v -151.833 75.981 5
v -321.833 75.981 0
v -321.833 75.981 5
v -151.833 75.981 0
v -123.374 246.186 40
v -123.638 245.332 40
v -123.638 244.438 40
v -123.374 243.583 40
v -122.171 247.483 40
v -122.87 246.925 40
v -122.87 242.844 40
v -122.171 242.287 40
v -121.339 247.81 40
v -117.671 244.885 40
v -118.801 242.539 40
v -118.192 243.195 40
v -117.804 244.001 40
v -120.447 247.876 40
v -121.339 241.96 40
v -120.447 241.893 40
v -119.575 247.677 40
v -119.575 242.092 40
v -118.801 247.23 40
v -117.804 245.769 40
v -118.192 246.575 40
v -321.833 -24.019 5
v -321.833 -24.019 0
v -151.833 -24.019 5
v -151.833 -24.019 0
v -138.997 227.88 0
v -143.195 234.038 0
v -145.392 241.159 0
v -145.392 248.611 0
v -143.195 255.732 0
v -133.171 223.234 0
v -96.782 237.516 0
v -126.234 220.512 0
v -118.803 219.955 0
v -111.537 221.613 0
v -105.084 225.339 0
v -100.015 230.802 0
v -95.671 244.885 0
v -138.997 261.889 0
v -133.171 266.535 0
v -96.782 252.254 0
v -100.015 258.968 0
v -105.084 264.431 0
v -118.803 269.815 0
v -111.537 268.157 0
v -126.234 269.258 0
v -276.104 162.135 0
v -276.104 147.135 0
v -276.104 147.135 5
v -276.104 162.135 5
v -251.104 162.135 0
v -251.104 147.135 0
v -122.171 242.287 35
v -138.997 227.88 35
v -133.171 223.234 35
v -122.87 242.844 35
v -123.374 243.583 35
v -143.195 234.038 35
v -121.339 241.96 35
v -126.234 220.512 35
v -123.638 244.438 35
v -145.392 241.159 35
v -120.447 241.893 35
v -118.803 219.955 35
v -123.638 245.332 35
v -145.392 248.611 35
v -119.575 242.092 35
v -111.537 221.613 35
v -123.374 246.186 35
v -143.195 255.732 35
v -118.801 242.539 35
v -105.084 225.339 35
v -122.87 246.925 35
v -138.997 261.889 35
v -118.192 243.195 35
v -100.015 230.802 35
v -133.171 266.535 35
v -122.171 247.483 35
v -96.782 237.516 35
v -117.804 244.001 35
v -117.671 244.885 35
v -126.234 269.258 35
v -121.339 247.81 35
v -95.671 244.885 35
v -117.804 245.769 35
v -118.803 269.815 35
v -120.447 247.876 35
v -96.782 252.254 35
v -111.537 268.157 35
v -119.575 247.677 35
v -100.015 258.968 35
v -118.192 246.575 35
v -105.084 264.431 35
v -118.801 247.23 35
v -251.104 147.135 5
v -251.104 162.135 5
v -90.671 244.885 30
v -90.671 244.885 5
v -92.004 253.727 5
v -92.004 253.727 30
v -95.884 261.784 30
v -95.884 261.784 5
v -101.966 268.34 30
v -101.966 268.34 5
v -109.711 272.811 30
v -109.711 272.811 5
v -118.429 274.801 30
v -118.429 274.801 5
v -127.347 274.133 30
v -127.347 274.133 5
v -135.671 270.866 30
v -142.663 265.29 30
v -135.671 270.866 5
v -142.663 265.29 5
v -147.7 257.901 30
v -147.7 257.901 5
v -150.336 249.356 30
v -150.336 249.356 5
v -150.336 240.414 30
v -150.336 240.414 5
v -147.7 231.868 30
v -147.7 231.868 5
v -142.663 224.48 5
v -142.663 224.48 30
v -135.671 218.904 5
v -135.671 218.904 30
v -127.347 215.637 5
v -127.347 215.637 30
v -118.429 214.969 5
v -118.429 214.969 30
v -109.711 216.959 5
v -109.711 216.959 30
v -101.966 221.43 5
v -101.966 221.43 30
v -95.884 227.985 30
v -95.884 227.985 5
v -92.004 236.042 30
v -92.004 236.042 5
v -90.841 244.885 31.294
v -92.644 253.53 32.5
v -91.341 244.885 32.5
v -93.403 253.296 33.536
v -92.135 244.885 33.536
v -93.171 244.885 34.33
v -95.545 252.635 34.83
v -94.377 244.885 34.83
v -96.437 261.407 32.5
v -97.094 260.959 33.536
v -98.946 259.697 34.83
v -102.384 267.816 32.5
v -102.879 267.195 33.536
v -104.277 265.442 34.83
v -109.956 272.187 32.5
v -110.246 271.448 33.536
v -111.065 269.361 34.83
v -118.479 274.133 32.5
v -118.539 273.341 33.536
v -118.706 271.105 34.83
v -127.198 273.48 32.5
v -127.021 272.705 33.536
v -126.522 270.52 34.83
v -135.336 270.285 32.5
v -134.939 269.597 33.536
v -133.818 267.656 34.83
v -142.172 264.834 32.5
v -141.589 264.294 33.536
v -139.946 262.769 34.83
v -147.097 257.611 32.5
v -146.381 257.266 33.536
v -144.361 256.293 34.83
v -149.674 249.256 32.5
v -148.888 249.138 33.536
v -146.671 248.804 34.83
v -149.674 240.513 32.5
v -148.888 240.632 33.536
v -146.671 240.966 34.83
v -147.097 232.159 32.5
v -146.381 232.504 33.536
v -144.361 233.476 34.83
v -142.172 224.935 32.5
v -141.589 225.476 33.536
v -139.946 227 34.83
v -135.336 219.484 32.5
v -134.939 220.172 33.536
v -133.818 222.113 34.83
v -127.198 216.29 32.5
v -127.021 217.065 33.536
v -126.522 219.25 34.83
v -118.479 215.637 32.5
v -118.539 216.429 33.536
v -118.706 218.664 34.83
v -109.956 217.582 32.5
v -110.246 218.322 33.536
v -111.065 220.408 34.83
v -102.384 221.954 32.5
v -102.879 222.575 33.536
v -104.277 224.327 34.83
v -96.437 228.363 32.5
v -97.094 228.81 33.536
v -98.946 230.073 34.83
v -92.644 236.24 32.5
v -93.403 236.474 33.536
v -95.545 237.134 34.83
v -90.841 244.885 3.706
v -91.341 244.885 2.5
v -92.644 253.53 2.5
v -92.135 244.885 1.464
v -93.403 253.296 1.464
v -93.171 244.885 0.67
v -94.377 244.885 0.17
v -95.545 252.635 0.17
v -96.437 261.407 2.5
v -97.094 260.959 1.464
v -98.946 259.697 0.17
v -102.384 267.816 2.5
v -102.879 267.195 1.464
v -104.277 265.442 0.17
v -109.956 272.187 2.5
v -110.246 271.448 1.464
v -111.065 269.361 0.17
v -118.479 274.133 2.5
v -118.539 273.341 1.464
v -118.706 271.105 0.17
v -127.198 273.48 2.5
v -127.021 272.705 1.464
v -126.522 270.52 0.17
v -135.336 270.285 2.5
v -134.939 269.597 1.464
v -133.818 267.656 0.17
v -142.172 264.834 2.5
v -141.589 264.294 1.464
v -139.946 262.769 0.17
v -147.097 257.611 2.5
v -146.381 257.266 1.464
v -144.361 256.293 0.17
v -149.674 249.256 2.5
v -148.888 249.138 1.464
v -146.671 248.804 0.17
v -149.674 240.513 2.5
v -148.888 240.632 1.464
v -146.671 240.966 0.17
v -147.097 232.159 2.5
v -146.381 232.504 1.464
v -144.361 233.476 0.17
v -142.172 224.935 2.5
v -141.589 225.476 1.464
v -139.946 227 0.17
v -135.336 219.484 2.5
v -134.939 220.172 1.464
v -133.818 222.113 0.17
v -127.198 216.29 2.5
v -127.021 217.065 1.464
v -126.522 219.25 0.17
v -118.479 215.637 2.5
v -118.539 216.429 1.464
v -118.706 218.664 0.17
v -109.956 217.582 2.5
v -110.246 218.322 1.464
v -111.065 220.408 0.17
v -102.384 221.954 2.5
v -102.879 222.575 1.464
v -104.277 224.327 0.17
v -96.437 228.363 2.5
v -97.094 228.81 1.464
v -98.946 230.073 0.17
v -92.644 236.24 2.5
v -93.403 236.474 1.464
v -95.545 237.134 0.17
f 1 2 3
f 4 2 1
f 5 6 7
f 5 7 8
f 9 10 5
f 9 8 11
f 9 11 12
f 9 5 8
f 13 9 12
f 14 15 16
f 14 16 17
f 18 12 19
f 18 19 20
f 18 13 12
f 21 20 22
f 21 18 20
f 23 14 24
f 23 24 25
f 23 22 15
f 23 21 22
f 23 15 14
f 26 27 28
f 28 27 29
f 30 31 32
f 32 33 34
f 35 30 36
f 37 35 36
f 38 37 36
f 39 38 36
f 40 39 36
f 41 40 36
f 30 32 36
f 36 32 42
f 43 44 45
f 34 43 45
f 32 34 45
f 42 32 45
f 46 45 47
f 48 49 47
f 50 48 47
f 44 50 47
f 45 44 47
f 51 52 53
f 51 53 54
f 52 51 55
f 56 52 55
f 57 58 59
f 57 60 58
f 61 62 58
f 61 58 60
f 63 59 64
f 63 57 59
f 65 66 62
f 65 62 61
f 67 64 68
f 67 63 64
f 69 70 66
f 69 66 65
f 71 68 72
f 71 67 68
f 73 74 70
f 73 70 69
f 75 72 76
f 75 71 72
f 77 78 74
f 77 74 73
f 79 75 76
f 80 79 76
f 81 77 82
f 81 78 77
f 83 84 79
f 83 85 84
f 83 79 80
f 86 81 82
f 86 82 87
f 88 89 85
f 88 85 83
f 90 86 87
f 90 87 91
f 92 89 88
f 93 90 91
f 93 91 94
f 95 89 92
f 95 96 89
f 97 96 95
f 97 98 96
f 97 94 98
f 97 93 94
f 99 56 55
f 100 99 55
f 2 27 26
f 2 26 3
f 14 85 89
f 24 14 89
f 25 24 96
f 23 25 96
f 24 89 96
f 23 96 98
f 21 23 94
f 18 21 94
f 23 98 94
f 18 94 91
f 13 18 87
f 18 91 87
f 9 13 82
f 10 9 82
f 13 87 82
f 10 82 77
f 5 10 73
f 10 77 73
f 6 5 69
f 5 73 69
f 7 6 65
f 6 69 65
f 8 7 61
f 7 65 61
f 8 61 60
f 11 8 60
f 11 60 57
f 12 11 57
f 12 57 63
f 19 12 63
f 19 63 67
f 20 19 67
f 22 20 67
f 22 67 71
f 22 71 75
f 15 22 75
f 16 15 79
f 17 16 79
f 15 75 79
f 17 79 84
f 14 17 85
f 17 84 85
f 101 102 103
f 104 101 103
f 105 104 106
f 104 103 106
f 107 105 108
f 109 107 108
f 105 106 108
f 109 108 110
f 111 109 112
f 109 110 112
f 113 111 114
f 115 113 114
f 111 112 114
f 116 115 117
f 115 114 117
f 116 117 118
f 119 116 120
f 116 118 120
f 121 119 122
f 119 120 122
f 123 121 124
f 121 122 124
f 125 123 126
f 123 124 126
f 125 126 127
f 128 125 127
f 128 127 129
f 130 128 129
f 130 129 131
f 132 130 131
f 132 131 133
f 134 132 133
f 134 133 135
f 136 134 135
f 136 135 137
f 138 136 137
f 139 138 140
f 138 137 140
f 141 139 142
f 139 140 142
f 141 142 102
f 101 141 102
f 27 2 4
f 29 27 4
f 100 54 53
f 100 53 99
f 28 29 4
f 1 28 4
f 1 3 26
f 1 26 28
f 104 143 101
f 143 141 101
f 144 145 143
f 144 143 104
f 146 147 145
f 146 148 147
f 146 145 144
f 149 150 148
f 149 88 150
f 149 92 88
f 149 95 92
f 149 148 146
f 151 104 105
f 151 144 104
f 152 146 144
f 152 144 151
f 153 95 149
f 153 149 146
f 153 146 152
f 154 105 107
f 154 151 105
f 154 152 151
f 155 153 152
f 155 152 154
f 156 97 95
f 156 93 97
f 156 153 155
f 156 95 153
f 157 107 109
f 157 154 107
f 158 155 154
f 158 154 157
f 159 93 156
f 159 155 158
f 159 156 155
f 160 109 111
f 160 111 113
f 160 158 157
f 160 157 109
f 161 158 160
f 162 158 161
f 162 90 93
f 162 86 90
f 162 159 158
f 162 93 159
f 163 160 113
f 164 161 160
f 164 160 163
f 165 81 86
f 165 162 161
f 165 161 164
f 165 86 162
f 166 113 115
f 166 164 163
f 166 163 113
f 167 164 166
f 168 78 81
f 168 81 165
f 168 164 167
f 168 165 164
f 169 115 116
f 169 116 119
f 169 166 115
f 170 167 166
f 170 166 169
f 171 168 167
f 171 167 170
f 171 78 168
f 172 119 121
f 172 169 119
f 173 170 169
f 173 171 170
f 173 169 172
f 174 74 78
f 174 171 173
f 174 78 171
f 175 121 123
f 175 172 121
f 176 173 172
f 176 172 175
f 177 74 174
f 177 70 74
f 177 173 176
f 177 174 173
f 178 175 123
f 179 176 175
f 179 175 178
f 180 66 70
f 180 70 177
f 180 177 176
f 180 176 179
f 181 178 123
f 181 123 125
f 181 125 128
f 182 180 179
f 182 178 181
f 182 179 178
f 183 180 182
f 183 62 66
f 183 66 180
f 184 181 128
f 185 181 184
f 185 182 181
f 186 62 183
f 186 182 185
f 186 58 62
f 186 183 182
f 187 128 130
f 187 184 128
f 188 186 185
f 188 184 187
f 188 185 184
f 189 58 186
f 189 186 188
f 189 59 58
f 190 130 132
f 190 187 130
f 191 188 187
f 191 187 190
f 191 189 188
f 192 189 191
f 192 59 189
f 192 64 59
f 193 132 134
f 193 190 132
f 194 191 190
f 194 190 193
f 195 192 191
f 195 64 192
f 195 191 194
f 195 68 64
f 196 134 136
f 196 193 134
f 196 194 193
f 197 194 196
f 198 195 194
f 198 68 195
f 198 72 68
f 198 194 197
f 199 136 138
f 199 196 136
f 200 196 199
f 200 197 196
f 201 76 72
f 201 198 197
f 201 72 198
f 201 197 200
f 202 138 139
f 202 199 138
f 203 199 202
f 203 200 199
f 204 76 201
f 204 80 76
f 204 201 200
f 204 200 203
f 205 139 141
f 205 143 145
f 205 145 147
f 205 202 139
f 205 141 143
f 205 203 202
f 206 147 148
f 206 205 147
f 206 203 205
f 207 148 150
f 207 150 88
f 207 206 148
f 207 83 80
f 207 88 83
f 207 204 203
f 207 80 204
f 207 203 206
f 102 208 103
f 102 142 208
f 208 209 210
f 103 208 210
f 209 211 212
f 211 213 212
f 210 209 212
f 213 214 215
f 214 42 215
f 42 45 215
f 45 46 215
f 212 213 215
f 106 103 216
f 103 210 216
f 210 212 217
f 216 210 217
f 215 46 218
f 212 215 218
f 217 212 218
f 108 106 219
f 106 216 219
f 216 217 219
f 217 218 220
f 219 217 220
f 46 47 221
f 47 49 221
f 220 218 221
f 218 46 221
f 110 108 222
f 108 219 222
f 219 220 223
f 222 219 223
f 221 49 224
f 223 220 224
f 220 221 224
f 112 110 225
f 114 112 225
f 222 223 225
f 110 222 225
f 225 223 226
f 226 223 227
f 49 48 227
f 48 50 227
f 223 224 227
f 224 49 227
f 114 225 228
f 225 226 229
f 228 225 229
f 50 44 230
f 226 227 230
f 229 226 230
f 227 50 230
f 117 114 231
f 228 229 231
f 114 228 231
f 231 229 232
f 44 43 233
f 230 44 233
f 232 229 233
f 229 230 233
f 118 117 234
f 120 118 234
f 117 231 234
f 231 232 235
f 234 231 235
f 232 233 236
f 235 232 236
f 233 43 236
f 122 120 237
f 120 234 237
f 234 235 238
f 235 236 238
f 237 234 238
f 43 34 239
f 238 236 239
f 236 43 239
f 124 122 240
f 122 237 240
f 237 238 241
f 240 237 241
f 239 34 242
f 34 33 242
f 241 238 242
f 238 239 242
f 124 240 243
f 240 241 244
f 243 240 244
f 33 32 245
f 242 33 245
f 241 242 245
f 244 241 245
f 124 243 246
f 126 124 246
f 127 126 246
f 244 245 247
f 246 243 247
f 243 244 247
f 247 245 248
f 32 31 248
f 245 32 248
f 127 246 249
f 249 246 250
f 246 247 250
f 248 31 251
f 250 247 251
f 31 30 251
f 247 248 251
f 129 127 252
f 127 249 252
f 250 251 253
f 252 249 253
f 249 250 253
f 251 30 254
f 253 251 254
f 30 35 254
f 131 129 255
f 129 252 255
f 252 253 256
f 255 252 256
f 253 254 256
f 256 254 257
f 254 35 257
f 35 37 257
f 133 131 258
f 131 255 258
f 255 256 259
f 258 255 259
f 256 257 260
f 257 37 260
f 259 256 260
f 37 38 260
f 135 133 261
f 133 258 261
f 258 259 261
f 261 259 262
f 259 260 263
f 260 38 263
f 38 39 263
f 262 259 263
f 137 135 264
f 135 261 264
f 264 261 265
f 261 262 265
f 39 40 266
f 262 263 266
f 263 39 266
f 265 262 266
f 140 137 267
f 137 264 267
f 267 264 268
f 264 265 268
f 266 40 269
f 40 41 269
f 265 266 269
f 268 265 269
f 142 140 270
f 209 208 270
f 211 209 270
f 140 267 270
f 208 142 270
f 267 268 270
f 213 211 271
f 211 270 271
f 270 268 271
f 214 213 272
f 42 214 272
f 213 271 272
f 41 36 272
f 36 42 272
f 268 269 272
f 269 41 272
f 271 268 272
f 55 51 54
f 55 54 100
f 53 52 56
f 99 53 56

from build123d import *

# Parameters (mm, degrees)
F0_W     = 170
F0_H     = 100
F1_DEPTH = 5
F2_R     = 30
F3_DEPTH = 35
F4_R     = 5
F5_R     = 3
F6_DEPTH = 5
F7_W     = 25
F7_H     = 15
F8_DEPTH = 5


with BuildPart() as f1:
    # F0 (on Top) → F1 (new body)
    with BuildSketch(Plane.XY):
        with Locations((-236.83264, 25.981316)):
            Rectangle(F0_W, F0_H)
    extrude(amount=F1_DEPTH)


with BuildPart() as f3:
    # F2 (on Top) → F3 (new body)
    with BuildSketch(Plane.XY):
        with Locations((-120.671019, 244.884789)):
            Circle(F2_R)
    extrude(amount=F3_DEPTH)

    # F4
    f4_edges = [f3.edges().sort_by_distance(p)[0] for p in [
        (-150.671019, 244.884789, 35),
        (-90.671019, 244.884789, 17.5),
        (-150.671019, 244.884789, 0),
    ]]
    fillet(f4_edges, radius=F4_R)

    # F5 (on face) → F6 (join)
    with BuildSketch(Plane.XY.offset(35)):
        with Locations((-120.671019, 244.884789)):
            Circle(F5_R)
    extrude(amount=F6_DEPTH)


with BuildPart() as f8:
    # F7 (on Top) → F8 (new body)
    with BuildSketch(Plane.XY):
        with Locations((-263.604499, 154.634513)):
            Rectangle(F7_W, F7_H)
    extrude(amount=F8_DEPTH)


solid = Compound([f1.part, f3.part, f8.part])
